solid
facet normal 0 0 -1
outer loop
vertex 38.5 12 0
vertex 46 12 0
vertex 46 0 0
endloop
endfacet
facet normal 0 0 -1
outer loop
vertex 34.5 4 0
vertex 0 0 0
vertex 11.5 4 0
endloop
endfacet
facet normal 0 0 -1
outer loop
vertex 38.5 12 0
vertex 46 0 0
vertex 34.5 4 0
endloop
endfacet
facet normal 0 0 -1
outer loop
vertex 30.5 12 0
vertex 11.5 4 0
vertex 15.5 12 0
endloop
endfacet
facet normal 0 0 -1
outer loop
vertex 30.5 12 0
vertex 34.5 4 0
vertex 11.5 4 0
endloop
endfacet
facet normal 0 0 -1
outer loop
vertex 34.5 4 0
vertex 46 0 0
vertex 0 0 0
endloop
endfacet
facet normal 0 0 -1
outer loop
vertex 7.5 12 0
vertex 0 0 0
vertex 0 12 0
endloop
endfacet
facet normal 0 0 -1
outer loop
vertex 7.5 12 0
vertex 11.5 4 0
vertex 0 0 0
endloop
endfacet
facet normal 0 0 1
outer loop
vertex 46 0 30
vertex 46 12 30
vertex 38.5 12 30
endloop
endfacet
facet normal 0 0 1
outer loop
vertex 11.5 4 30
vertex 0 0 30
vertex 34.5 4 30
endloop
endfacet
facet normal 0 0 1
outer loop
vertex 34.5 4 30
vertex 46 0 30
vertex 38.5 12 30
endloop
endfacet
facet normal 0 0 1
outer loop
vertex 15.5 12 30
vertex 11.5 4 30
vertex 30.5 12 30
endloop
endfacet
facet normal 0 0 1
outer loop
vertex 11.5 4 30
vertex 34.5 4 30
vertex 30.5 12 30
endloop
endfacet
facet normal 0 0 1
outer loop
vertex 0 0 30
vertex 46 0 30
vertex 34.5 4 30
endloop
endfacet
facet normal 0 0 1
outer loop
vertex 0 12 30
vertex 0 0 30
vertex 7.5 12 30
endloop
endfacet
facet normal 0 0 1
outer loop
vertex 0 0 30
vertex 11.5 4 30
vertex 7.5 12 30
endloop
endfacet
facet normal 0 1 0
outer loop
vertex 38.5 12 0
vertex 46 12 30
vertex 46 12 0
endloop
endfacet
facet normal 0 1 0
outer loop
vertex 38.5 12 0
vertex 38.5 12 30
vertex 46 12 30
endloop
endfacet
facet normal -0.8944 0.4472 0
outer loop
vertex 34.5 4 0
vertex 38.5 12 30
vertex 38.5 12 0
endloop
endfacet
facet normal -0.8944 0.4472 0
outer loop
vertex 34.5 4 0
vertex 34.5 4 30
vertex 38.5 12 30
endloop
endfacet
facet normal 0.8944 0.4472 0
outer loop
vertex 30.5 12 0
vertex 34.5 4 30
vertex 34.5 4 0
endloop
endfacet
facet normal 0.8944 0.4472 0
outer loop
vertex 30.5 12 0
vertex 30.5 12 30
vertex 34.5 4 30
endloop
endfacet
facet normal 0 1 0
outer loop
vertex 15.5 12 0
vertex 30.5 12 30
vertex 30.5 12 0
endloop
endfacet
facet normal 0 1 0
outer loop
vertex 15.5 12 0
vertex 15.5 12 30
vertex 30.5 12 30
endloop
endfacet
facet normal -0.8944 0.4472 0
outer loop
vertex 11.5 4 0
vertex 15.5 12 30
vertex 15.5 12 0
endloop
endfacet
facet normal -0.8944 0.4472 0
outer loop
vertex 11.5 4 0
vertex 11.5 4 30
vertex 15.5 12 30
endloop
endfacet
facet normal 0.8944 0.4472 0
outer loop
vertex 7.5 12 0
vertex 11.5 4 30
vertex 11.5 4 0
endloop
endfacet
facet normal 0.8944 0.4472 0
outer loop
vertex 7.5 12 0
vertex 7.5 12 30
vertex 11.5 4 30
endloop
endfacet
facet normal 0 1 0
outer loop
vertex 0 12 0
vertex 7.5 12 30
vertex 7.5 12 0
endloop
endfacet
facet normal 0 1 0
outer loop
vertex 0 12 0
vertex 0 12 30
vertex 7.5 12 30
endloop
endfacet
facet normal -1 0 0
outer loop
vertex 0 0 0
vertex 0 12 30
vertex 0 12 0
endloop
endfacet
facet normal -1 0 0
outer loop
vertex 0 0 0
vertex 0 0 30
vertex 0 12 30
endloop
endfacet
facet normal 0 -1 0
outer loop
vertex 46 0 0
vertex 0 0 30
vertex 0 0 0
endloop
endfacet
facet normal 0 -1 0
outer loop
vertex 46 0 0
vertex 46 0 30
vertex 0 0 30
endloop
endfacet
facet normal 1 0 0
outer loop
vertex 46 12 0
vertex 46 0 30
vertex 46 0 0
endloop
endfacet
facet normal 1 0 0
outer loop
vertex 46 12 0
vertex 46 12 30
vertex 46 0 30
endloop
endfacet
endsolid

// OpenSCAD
$fn = 32;

// ----------------------------------------------------------------------
// V guide rail: doublev, 46 mm wide
// ----------------------------------------------------------------------

// --- parameters (mm) ---
rail_w = 46;              // rail width, X
base_t = 12;              // base plate thickness
v_depth = 8;              // V feature depth / height
v_half_w = 8;             // half width of the V at the base face
plate_t = 30;             // rail length, Z (the extrusion height)
groove_off = 11.5;        // offset of each groove from the centreline

centre_x = rail_w / 2;  // rail centreline
groove_a = centre_x - groove_off;  // axis of the first groove
groove_b = centre_x + groove_off;  // axis of the second groove

profile = [[0, 0], [46, 0], [46, 12], [38.5, 12], [34.5, 4], [30.5, 12], [15.5, 12], [11.5, 4], [7.5, 12], [0, 12]];  // primary outline, 10 points, counter clockwise

// --- the one profile operation ---
linear_extrude(height = plate_t) polygon(points = profile);
